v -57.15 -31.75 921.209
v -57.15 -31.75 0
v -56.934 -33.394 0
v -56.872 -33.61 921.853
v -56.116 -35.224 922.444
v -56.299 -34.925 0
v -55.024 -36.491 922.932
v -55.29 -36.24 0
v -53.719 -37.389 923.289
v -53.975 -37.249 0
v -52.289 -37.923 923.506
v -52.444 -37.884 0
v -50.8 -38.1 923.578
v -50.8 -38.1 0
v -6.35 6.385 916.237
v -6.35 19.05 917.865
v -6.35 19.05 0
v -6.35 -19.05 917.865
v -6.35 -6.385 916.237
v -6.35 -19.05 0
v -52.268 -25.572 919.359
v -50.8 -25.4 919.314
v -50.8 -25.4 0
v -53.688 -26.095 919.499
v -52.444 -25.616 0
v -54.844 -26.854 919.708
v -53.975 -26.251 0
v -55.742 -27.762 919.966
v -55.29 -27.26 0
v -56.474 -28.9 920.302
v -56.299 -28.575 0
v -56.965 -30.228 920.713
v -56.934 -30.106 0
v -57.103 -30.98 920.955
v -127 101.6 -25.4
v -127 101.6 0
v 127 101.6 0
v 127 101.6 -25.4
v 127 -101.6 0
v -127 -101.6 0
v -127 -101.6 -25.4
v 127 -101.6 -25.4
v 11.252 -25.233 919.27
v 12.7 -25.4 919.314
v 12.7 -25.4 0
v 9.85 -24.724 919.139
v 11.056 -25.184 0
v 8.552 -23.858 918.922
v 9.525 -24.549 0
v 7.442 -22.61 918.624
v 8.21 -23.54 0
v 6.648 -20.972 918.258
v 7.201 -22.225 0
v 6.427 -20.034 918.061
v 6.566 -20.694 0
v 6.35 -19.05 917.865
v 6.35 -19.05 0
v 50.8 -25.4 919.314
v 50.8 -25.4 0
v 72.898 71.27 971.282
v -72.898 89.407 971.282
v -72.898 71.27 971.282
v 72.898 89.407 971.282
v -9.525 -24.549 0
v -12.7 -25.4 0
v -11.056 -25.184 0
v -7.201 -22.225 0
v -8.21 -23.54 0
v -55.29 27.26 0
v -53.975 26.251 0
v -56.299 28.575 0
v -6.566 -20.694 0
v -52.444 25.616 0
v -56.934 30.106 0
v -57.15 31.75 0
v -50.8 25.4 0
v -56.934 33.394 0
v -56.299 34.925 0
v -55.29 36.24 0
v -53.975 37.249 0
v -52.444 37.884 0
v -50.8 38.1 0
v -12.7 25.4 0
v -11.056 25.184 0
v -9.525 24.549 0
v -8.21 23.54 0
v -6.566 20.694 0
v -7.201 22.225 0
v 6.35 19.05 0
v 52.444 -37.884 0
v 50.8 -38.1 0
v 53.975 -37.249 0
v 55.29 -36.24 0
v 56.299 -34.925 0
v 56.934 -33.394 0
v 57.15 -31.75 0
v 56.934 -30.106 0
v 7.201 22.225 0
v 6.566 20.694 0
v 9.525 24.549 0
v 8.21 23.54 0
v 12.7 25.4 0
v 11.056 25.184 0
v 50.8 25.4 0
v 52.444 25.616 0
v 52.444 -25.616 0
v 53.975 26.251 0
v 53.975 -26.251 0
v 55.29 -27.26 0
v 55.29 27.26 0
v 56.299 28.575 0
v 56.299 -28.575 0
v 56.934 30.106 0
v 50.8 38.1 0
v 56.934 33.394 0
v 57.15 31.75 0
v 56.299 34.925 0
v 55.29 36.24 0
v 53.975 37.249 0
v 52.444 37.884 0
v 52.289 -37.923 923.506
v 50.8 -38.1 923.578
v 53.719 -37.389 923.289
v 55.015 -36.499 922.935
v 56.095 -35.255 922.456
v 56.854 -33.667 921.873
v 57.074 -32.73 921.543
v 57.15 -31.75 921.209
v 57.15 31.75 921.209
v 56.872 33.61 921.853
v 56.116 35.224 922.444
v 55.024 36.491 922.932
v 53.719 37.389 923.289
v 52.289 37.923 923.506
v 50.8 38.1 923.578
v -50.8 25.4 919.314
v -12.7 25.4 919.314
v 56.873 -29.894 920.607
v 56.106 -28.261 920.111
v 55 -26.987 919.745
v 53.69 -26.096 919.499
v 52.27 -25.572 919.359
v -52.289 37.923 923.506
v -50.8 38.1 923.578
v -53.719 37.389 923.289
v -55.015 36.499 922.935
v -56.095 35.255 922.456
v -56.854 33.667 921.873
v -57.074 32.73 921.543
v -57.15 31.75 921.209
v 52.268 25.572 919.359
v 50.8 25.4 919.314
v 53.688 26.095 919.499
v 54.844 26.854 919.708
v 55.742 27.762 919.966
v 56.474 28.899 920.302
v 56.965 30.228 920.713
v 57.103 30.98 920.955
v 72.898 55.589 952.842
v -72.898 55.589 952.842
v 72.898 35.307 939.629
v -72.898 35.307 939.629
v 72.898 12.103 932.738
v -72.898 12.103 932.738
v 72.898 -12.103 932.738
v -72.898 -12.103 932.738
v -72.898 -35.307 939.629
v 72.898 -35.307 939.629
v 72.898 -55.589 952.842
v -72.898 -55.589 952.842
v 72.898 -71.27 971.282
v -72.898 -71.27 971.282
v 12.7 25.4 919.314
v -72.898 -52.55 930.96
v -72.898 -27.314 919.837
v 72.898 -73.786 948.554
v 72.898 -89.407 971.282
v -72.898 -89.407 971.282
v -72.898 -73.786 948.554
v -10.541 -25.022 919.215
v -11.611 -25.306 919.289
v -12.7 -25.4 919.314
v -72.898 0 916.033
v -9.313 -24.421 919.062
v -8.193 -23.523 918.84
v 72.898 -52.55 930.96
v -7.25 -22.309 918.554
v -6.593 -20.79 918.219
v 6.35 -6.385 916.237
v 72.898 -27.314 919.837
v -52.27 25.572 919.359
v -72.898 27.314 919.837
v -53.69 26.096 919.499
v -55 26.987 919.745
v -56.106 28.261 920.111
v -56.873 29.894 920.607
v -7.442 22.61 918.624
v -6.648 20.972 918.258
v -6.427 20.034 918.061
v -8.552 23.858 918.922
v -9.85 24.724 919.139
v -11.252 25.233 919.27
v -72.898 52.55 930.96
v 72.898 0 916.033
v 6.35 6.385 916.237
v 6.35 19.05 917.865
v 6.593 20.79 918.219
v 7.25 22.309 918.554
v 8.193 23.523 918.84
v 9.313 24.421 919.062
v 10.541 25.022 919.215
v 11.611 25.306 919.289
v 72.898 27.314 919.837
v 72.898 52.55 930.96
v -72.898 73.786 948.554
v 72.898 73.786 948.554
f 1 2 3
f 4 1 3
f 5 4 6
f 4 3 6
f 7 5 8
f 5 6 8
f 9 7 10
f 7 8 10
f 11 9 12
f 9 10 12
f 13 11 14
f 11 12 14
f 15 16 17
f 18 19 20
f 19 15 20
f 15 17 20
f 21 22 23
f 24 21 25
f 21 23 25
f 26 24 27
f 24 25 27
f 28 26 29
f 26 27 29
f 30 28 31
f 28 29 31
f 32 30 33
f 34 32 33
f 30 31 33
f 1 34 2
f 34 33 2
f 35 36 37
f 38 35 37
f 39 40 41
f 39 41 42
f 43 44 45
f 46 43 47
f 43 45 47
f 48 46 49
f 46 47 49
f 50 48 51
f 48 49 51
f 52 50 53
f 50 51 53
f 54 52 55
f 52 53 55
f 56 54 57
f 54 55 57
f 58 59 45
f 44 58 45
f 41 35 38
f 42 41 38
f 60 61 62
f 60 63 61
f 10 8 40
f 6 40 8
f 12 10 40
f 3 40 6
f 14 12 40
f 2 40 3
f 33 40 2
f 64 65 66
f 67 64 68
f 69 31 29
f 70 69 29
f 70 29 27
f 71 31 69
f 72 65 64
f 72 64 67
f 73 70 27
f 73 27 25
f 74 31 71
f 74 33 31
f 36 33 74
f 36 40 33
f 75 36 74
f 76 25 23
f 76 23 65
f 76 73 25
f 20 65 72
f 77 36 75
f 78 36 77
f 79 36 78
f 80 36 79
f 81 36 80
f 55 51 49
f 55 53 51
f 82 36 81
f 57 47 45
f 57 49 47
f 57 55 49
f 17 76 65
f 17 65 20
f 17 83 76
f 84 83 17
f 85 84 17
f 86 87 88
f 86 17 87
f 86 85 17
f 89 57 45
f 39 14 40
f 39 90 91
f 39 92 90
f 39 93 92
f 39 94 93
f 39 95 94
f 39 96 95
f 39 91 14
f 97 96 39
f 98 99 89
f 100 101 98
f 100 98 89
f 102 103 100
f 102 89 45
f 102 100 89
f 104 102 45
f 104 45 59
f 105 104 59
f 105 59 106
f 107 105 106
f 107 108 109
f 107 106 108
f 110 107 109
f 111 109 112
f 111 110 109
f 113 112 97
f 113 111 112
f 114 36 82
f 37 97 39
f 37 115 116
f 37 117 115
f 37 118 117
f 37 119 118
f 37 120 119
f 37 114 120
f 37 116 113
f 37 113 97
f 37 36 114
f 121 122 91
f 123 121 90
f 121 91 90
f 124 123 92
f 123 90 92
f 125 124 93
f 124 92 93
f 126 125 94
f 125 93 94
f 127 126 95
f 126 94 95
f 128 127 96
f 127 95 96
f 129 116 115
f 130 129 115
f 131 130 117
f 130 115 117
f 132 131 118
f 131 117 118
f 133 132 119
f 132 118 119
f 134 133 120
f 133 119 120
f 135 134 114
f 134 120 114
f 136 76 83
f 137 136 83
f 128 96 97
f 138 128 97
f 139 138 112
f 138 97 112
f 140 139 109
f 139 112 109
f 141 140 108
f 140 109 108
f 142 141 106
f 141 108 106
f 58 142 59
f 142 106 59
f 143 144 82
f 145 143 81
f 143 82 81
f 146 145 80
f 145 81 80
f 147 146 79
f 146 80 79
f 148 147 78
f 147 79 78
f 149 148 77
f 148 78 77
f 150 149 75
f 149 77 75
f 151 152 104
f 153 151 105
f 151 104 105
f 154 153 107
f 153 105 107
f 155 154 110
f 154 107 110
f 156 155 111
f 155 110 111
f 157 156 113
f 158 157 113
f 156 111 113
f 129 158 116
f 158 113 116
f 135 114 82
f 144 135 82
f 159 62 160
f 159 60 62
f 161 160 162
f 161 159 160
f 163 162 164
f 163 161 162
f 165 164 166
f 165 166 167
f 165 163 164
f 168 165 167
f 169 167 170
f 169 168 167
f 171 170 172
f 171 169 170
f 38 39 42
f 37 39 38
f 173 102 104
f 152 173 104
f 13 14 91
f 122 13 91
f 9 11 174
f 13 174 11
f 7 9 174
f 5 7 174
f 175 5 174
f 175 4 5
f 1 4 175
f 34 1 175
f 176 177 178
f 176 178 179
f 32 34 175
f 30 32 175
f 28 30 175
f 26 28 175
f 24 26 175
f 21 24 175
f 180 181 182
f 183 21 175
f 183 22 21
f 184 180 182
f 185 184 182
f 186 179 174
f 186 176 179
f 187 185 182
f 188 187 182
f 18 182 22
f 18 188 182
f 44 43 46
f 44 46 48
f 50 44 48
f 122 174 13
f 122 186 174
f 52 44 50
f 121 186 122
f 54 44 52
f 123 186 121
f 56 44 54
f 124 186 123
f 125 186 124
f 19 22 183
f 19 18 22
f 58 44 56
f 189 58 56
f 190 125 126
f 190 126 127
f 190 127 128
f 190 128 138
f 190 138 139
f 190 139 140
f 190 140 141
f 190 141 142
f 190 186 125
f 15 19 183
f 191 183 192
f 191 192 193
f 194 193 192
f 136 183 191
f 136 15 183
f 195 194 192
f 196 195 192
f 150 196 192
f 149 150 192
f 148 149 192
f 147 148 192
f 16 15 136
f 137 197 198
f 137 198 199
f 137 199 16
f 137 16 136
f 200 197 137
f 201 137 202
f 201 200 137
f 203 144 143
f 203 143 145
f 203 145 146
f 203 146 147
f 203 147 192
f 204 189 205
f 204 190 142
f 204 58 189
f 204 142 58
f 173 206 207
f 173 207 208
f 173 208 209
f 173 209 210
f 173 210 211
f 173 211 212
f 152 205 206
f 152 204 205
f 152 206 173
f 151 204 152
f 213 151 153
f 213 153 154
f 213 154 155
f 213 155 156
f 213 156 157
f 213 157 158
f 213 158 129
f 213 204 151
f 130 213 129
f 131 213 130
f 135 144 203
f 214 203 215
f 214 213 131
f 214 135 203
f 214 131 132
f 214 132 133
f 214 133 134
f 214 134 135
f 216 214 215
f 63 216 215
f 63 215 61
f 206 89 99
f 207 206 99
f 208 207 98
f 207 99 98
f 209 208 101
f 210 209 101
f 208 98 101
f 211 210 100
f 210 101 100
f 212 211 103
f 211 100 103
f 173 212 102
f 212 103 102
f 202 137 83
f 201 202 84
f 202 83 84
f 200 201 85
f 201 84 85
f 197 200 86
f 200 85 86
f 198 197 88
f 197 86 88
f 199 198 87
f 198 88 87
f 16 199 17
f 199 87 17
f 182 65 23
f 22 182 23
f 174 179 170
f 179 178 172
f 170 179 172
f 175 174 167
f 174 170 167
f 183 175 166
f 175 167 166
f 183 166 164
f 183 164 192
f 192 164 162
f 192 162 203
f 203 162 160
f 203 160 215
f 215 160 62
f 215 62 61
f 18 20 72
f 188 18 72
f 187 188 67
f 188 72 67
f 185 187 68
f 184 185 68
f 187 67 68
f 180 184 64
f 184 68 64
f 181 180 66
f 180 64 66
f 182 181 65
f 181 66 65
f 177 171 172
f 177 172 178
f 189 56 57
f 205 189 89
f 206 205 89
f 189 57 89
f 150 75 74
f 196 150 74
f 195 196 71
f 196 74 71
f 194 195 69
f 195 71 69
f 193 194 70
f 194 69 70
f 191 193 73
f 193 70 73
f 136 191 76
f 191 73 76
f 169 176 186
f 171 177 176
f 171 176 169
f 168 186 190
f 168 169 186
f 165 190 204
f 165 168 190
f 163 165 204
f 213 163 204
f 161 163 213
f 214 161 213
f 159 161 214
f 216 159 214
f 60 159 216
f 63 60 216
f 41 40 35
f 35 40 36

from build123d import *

# Parameters (mm, degrees)
F1_W     = 254
F1_H     = 203.2
F2_DEPTH = 25.4
F3_DEPTH = 1019.048
F5_DEPTH = 103.124
F6_DEPTH = 72.898


with BuildPart() as f2:
    # F1 (on Top) → F2 (new body)
    with BuildSketch(Plane.XY):
        Rectangle(F1_W, F1_H)
    extrude(amount=-F2_DEPTH)

    # F0 (on Top) → F3 (join)
    with BuildSketch(Plane.XY):
        with BuildLine():
            ThreePointArc((57.15, 31.75), (55.2901280605, 36.2401280605), (50.8, 38.1))
            Line((50.8, 38.1), (-50.8, 38.1))
            ThreePointArc((-50.8, 38.1), (-55.2901280605, 36.2401280605), (-57.15, 31.75))
            ThreePointArc((-57.15, 31.75), (-55.2901280605, 27.2598719395), (-50.8, 25.4))
            Line((-50.8, 25.4), (-12.7, 25.4))
            ThreePointArc((-12.7, 25.4), (-8.2098719395, 23.5401280605), (-6.35, 19.05))
            Line((-6.35, 19.05), (-6.35, -19.05))
            ThreePointArc((-6.35, -19.05), (-8.2098719395, -23.5401280605), (-12.7, -25.4))
            Line((-12.7, -25.4), (-50.8, -25.4))
            ThreePointArc((-50.8, -25.4), (-55.2901280605, -27.2598719395), (-57.15, -31.75))
            ThreePointArc((-57.15, -31.75), (-55.2901280605, -36.2401280605), (-50.8, -38.1))
            Line((-50.8, -38.1), (50.8, -38.1))
            ThreePointArc((50.8, -38.1), (55.2901280605, -36.2401280605), (57.15, -31.75))
            ThreePointArc((57.15, -31.75), (55.2901280605, -27.2598719395), (50.8, -25.4))
            Line((50.8, -25.4), (12.7, -25.4))
            ThreePointArc((12.7, -25.4), (8.2098719395, -23.5401280605), (6.35, -19.05))
            Line((6.35, -19.05), (6.35, 19.05))
            ThreePointArc((6.35, 19.05), (8.2098719395, 23.5401280605), (12.7, 25.4))
            Line((12.7, 25.4), (50.8, 25.4))
            ThreePointArc((50.8, 25.4), (55.2901280605, 27.2598719395), (57.15, 31.75))
        make_face()
    extrude(amount=F3_DEPTH)

    # F4 (on Right) → F5 (cut, symmetric)
    with BuildSketch(Plane.YZ):
        with BuildLine():
            ThreePointArc((71.2698618146, 971.2817072868), (80.8566228106, 992.7335981743), (84.1375, 1016))
            ThreePointArc((84.1375, 1016), (-23.2664018257, 1096.8566228106), (-71.2698618146, 971.2817072868))
            ThreePointArc((-71.2698618146, 971.2817072868), (0, 931.8625), (71.2698618146, 971.2817072868))
        make_face()
    extrude(amount=F5_DEPTH, both=True, mode=Mode.SUBTRACT)

    # F4 (on Right) → F6 (join, symmetric)
    with BuildSketch(Plane.YZ):
        with BuildLine():
            ThreePointArc((71.2698618146, 971.2817072868), (0, 931.8625), (-71.2698618146, 971.2817072868))
            Line((-71.2698618146, 971.2817072868), (-89.4071367489, 971.2817072868))
            ThreePointArc((-89.4071367489, 971.2817072868), (0, 916.0331964859), (89.4071367489, 971.2817072868))
            Line((89.4071367489, 971.2817072868), (71.2698618146, 971.2817072868))
        make_face()
    extrude(amount=F6_DEPTH, both=True)


solid = f2.part
